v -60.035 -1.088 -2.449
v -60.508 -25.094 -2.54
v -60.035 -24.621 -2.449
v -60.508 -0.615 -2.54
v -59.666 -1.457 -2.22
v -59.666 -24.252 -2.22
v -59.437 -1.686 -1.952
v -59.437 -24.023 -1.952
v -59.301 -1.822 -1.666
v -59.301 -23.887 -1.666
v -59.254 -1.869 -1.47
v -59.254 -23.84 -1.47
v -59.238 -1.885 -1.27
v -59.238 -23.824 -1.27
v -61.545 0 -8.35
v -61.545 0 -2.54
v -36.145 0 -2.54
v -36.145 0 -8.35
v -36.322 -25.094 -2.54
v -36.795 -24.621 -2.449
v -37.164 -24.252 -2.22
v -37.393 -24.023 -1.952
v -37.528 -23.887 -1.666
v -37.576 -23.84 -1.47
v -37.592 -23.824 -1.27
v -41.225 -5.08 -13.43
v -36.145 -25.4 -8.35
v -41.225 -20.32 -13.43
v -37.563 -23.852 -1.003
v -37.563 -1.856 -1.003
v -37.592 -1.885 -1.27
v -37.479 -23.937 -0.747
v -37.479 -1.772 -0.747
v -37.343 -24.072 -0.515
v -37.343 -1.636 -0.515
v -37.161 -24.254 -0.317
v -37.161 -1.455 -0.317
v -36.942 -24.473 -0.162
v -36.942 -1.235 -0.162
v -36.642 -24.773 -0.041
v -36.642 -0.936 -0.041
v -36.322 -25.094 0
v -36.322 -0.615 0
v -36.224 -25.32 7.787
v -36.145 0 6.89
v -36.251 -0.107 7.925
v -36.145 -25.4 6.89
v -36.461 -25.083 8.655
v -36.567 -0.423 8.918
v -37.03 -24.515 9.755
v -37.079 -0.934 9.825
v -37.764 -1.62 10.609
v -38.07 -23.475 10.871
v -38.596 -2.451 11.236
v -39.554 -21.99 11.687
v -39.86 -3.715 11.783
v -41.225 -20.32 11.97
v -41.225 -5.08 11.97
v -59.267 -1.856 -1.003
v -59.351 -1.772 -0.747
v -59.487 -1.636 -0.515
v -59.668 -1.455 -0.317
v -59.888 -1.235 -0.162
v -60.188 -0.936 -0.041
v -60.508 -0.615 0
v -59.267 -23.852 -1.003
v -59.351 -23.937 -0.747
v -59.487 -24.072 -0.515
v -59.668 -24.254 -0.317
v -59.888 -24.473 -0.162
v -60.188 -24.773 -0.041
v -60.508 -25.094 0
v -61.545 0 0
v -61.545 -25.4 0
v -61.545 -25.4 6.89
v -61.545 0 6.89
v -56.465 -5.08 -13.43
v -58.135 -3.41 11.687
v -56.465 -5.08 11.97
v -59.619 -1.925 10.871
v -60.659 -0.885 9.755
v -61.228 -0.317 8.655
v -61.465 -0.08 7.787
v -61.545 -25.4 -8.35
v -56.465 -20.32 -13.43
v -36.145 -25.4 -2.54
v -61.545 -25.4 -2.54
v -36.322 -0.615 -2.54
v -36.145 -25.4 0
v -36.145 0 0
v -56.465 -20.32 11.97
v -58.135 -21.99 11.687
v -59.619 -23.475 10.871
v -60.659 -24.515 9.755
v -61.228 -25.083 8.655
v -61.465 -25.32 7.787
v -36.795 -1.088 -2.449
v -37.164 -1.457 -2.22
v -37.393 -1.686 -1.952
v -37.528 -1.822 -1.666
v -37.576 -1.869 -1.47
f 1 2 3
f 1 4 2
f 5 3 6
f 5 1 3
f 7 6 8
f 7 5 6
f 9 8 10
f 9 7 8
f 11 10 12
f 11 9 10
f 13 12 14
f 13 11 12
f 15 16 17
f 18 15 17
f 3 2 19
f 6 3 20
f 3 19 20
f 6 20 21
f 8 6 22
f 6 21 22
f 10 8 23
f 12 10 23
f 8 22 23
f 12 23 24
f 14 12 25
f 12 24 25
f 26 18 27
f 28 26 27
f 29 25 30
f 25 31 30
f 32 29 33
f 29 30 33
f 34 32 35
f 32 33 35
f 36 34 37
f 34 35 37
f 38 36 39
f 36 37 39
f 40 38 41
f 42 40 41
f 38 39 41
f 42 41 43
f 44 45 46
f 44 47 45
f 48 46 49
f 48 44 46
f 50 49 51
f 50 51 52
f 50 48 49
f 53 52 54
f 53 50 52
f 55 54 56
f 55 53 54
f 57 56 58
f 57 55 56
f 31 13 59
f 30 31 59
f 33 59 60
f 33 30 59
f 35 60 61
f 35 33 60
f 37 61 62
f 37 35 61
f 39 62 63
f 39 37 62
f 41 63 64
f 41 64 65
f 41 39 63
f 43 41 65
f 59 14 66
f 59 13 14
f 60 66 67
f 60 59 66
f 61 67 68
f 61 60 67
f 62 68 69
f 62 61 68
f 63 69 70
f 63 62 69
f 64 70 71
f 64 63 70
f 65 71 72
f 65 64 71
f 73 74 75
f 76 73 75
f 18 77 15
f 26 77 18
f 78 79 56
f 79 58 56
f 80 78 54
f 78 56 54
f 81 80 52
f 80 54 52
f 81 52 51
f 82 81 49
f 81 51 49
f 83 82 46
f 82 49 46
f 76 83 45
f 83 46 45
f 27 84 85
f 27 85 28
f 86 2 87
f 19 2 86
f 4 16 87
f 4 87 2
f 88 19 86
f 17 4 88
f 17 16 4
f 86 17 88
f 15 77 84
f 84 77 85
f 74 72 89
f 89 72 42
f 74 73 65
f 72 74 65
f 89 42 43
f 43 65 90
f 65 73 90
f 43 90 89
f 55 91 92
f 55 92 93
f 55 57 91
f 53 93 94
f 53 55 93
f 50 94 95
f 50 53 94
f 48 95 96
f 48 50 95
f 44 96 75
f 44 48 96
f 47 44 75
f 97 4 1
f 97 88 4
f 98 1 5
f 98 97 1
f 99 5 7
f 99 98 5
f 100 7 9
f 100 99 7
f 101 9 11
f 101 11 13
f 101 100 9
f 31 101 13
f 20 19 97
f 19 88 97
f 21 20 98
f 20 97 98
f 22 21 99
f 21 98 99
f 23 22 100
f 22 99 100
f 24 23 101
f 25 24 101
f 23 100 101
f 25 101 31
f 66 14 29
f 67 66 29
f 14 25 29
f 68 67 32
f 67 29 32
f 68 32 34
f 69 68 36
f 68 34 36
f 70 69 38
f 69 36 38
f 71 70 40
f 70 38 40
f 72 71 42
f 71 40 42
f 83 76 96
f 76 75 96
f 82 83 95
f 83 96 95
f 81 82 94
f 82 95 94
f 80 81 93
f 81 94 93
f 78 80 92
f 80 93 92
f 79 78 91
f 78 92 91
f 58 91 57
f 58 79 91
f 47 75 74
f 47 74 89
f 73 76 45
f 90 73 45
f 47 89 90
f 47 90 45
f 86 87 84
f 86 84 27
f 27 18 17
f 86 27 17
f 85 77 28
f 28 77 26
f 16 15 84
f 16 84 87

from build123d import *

# Parameters (mm, degrees)
F0_W     = 25.4
F0_H     = 25.4
F1_DEPTH = 25.4
F2_R     = 5.08
F3_SIZE  = 5.08
F4_W     = 25.741957128
F4_H     = 25.5791675299
F4_W_2   = 21.6466449201
F4_H_2   = 21.9391710125
F5_DEPTH = 2.54
F6_R     = 1.26999


# Not quite as in the source:
# - a fillet or chamfer is up to 0.001 mm smaller than in the source, because OpenCascade refuses the exact size


with BuildPart() as f1:
    # F0 (on Front) → F1 (new body)
    with BuildSketch(Plane.XZ):
        with Locations((-48.8445848724, -0.7304809988)):
            Rectangle(F0_W, F0_H)
    extrude(amount=F1_DEPTH)

    # F2
    f2_edges = [f1.edges().sort_by_distance(p)[0] for p in [
        (-48.844585, -25.4, 11.969519),
        (-36.144585, -12.7, 11.969519),
        (-48.844585, 0, 11.969519),
        (-61.544585, -12.7, 11.969519),
    ]]
    fillet(f2_edges, radius=F2_R)

    # F3
    f3_edges = [f1.edges().sort_by_distance(p)[0] for p in [
        (-48.844585, -25.4, -13.430481),
        (-36.144585, -12.7, -13.430481),
        (-61.544585, -12.7, -13.430481),
        (-48.844585, 0, -13.430481),
    ]]
    chamfer(f3_edges, length=F3_SIZE)

    # F4 (on Top) → F5 (cut)
    with BuildSketch(Plane.XY):
        with Locations((-48.707395792, -12.789583765)):
            Rectangle(F4_W, F4_H)
        with Locations((-48.4148729593, -12.8544487525)):
            Rectangle(F4_W_2, F4_H_2, mode=Mode.SUBTRACT)
    extrude(amount=-F5_DEPTH, mode=Mode.SUBTRACT)

    # F6 (radius 1.27 in the source; OpenCascade refuses exactly that, so slightly less here)
    f6_edges = [f1.edges().sort_by_distance(p)[0] for p in [
        (-48.414873, -1.884863, -2.54),
        (-37.59155, -12.854449, -2.54),
        (-48.414873, -1.884863, 0),
        (-37.59155, -12.854449, 0),
        (-48.414873, -23.824034, -2.54),
        (-59.238195, -12.854449, -2.54),
        (-48.414873, -23.824034, 0),
        (-59.238195, -12.854449, 0),
    ]]
    fillet(f6_edges, radius=F6_R)


solid = f1.part
